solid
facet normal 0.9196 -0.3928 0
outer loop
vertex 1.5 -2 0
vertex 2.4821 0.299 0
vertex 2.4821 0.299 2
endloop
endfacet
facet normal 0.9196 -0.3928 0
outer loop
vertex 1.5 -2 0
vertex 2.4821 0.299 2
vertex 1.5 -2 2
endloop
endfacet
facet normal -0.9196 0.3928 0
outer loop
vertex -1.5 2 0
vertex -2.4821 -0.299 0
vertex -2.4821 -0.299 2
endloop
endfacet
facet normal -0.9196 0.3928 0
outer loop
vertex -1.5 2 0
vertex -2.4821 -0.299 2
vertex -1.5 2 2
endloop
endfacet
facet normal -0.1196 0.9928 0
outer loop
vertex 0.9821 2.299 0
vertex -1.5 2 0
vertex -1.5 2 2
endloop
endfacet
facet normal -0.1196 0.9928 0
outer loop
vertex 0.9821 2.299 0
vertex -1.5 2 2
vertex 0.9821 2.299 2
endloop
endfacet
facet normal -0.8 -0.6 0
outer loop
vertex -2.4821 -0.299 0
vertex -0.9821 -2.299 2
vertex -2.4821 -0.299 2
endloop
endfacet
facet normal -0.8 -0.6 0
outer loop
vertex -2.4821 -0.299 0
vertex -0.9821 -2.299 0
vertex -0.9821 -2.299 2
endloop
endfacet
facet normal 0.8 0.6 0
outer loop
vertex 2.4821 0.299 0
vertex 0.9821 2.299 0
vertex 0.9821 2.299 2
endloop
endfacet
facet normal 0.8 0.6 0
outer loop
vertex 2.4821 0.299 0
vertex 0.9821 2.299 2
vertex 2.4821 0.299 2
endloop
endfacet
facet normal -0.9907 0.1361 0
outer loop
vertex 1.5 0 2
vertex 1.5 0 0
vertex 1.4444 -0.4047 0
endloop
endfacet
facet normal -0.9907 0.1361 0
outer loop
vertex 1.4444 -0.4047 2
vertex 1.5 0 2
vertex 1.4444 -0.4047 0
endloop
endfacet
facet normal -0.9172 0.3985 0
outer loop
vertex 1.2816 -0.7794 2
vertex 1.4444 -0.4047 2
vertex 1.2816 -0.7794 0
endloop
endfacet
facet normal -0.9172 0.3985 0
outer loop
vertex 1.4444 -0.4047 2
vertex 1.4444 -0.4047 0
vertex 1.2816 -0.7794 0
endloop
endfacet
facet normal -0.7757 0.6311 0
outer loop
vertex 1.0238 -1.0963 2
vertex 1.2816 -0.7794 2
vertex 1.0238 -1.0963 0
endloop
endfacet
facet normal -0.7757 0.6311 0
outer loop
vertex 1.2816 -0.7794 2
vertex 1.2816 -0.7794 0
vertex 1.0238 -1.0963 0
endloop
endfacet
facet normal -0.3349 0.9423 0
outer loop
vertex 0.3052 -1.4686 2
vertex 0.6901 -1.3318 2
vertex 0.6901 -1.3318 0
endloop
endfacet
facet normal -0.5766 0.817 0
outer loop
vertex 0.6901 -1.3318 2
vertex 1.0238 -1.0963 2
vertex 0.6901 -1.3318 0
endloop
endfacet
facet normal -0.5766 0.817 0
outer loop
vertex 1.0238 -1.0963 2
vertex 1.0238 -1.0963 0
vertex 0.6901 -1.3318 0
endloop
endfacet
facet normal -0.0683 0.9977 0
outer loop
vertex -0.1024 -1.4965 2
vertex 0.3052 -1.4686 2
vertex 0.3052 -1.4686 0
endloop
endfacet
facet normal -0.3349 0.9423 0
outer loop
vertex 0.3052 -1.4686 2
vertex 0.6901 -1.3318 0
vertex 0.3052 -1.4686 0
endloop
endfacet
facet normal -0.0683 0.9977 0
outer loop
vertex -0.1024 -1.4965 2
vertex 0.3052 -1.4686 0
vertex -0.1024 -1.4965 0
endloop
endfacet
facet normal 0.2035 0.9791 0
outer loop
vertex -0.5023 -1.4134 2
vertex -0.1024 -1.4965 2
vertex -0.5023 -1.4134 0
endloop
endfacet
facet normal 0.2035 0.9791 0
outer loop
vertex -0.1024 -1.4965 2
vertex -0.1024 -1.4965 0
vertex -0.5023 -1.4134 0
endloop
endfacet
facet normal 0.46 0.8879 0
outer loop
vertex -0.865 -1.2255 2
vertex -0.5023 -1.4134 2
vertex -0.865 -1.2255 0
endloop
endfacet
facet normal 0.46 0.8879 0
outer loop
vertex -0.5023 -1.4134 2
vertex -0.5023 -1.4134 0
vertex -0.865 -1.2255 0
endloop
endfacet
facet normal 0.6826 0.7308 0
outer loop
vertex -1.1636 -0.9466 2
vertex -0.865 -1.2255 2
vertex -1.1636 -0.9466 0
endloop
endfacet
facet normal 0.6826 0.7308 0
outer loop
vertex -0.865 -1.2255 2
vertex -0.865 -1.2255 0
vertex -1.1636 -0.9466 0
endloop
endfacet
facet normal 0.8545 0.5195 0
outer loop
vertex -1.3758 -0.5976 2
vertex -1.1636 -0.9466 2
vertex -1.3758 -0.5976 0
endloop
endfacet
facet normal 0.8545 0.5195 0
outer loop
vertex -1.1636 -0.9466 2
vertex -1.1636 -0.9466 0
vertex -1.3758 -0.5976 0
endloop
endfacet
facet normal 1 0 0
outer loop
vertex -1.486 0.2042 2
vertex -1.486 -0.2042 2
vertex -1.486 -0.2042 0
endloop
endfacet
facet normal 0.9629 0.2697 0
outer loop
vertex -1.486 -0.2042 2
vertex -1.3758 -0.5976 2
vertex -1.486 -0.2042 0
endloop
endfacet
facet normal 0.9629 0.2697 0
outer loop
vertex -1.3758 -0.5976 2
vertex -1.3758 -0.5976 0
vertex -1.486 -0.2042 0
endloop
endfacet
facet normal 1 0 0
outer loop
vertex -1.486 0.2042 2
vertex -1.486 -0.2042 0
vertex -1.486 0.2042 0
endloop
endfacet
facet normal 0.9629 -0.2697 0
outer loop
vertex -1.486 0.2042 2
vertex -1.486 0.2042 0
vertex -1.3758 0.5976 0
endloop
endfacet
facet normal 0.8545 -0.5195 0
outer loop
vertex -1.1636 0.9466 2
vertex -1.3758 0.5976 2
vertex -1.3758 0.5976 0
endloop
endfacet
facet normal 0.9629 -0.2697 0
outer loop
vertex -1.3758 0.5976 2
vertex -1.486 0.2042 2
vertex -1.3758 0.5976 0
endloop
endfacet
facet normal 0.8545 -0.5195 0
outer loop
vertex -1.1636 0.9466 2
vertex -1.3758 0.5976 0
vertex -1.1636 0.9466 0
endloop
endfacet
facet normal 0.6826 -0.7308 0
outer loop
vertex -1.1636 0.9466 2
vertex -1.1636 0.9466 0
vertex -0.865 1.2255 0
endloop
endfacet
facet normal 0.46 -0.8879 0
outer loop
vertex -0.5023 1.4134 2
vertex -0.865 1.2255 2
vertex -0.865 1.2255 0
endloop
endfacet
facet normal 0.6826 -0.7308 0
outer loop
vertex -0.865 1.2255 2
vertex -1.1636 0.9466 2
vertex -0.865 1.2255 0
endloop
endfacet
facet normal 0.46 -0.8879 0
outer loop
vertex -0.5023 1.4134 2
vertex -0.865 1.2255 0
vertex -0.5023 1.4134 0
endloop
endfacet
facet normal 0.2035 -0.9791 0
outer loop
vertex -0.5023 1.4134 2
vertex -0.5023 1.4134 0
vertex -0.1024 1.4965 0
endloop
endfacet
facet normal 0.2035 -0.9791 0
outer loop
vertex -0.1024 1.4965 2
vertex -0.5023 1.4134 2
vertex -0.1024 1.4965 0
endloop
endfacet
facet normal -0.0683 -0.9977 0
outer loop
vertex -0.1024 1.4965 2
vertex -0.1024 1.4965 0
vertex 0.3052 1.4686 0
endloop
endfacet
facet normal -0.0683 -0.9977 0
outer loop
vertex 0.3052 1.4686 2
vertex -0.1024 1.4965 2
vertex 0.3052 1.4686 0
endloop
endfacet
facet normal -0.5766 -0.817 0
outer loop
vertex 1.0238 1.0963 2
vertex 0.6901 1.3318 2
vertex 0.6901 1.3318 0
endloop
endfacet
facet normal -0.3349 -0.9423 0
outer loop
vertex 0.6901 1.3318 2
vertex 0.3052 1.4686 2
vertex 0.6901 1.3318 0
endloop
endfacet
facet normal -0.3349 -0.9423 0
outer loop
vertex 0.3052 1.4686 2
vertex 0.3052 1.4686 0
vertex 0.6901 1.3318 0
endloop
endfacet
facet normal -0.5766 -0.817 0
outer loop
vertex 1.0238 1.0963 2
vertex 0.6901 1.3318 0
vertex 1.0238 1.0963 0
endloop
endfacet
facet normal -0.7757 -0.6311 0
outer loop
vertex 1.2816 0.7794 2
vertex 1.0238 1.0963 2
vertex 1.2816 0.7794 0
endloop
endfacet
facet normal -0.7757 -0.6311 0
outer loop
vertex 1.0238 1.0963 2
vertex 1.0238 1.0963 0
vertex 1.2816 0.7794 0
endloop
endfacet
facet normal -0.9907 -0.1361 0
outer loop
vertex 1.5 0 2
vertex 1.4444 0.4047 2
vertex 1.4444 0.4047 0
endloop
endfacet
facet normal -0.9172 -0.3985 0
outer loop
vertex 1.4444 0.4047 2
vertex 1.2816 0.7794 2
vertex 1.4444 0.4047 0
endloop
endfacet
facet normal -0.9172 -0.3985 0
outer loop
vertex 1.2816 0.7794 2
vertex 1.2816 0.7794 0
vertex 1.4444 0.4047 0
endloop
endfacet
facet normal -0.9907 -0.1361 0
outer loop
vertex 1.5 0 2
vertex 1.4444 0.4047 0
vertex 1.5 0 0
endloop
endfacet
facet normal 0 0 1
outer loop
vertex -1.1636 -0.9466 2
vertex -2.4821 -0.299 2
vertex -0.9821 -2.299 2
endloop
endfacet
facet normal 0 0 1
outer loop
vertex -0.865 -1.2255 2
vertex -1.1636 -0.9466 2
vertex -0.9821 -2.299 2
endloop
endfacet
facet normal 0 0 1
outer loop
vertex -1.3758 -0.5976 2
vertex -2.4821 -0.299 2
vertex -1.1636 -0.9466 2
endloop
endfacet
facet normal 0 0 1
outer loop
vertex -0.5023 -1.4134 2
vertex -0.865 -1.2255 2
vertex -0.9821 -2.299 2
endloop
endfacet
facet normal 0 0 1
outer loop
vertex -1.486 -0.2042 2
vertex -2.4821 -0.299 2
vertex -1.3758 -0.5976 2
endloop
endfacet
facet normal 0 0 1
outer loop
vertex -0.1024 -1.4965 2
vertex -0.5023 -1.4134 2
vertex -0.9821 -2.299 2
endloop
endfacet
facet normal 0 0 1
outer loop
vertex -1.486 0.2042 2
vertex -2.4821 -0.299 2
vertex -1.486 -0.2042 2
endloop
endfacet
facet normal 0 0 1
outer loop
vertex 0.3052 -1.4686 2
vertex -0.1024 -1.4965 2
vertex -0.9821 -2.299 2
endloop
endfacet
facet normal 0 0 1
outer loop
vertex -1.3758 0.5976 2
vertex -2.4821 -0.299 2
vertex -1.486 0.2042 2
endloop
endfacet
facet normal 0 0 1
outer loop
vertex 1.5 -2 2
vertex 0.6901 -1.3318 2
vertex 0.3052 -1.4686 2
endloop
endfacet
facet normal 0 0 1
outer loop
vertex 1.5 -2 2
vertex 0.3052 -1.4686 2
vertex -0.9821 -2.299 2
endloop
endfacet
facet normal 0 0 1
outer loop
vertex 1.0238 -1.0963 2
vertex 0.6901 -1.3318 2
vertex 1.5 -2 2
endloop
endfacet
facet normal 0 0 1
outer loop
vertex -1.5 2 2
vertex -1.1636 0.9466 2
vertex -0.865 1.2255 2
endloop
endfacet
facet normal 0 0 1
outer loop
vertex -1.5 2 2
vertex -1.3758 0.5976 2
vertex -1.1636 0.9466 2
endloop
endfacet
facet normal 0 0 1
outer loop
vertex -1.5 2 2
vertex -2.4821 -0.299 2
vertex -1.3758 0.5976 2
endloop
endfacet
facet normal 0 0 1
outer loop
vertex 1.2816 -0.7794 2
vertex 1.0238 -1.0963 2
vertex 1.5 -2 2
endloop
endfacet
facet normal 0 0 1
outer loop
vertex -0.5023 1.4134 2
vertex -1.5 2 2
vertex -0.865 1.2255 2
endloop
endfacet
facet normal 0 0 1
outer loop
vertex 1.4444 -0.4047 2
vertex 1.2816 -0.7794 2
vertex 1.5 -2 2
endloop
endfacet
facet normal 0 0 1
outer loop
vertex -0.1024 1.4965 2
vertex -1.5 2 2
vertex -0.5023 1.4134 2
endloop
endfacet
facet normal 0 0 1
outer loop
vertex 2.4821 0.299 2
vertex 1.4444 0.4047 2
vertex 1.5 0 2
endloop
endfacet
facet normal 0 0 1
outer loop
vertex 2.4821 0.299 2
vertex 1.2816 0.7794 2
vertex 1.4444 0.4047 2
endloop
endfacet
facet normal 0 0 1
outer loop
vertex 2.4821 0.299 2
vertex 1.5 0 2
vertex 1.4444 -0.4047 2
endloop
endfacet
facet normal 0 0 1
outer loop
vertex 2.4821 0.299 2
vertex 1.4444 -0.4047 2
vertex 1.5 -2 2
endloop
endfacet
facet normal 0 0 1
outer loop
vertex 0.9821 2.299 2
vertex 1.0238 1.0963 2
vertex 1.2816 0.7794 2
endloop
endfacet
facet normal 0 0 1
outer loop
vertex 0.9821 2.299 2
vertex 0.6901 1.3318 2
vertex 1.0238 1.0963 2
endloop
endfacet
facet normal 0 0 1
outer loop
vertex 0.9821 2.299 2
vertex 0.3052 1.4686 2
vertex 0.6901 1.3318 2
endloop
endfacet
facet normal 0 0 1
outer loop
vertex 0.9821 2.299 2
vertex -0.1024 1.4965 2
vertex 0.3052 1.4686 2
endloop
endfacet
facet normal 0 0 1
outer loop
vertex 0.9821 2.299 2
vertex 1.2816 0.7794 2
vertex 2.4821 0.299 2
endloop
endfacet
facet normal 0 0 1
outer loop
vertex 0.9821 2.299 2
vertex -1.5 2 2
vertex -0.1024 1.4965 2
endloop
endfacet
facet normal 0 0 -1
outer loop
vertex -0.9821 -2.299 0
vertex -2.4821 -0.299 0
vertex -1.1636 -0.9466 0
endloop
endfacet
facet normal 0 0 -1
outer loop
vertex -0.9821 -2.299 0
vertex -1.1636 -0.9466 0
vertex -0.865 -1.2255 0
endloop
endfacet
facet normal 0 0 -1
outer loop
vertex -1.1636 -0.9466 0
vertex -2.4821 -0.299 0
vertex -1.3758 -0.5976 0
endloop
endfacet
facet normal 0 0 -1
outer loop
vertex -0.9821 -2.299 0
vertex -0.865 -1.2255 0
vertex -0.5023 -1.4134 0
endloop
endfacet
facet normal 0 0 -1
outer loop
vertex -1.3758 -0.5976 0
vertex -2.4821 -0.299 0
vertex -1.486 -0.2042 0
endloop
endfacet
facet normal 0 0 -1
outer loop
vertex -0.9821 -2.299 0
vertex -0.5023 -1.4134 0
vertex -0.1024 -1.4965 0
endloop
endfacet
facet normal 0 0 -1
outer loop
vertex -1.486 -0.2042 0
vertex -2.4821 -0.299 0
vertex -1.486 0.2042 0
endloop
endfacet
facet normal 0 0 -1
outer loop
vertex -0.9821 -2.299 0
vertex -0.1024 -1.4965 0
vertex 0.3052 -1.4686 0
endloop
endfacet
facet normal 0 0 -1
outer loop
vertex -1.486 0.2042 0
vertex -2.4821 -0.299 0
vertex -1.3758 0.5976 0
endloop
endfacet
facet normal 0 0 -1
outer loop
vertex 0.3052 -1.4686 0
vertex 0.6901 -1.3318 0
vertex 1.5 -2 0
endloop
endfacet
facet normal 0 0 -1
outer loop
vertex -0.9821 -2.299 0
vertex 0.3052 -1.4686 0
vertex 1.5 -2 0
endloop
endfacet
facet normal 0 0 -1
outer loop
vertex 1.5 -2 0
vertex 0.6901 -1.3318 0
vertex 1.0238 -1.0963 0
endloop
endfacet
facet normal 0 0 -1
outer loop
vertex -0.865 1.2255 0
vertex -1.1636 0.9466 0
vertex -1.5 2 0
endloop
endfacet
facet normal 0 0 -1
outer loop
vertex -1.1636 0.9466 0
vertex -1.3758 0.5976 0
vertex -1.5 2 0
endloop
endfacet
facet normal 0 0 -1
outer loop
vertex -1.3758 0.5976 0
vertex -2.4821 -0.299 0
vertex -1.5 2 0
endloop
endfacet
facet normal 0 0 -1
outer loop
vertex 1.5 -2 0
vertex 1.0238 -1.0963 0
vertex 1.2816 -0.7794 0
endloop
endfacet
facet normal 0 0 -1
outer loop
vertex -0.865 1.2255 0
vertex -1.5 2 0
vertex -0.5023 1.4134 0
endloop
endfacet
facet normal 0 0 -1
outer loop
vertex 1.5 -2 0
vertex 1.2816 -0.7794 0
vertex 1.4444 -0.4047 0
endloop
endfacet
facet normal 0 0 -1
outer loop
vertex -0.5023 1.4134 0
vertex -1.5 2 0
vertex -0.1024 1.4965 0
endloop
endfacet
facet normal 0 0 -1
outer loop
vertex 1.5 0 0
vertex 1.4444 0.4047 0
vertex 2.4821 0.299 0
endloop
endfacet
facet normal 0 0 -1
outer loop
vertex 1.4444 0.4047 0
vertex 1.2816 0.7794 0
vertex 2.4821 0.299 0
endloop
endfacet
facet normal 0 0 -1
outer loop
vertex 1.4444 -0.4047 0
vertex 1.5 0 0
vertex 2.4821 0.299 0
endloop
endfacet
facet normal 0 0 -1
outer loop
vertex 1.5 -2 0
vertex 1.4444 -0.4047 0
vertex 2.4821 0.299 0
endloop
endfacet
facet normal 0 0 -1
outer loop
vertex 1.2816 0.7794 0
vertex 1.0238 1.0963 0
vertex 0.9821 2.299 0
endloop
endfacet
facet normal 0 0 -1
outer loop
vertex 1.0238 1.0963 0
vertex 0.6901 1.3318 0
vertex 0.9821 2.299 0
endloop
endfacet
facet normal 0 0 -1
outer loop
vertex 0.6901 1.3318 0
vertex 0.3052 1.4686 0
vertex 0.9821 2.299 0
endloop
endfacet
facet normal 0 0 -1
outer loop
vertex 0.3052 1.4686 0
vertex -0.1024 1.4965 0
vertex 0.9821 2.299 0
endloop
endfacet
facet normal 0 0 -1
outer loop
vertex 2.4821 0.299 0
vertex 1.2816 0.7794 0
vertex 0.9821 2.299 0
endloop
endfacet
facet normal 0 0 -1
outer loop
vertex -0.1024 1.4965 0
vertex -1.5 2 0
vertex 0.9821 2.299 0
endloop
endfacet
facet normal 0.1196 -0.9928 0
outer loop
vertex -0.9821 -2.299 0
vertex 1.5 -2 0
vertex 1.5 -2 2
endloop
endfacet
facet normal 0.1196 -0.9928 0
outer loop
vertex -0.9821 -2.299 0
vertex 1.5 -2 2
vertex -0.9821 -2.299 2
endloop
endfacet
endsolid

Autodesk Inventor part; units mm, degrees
ref_plane "YZ Plane" through (0, 0, 0) normal (1, 0, 0) x (0, 1, 0)
ref_plane "XZ Plane" through (0, 0, 0) normal (0, 1, 0) x (-1, 0, 0)
ref_plane "XY Plane" through (0, 0, 0) normal (0, 0, 1) x (1, 0, 0)
sketch "Sketch1" plane through (0, 0, 0) normal (0, 0, 1) x (1, 0, 0)
  circle A0 centre (0, 0) radius 1.5
  line L0 (-1.5, 2) -> (0.9821, 2.299)
  line L1 (0.9821, 2.299) -> (2.4821, 0.299)
  line L2 (2.4821, 0.299) -> (1.5, -2)
  line L3 (1.5, -2) -> (-0.9821, -2.299)
  line L4 (-0.9821, -2.299) -> (-2.4821, -0.299)
  line L5 (-2.4821, -0.299) -> (-1.5, 2)
  dimension "d0" = 3
extrude "Extrusion1" add sketch "Sketch1" along normal blind 2
properties part number "m3_nut" material "Steel, Galvanized"
